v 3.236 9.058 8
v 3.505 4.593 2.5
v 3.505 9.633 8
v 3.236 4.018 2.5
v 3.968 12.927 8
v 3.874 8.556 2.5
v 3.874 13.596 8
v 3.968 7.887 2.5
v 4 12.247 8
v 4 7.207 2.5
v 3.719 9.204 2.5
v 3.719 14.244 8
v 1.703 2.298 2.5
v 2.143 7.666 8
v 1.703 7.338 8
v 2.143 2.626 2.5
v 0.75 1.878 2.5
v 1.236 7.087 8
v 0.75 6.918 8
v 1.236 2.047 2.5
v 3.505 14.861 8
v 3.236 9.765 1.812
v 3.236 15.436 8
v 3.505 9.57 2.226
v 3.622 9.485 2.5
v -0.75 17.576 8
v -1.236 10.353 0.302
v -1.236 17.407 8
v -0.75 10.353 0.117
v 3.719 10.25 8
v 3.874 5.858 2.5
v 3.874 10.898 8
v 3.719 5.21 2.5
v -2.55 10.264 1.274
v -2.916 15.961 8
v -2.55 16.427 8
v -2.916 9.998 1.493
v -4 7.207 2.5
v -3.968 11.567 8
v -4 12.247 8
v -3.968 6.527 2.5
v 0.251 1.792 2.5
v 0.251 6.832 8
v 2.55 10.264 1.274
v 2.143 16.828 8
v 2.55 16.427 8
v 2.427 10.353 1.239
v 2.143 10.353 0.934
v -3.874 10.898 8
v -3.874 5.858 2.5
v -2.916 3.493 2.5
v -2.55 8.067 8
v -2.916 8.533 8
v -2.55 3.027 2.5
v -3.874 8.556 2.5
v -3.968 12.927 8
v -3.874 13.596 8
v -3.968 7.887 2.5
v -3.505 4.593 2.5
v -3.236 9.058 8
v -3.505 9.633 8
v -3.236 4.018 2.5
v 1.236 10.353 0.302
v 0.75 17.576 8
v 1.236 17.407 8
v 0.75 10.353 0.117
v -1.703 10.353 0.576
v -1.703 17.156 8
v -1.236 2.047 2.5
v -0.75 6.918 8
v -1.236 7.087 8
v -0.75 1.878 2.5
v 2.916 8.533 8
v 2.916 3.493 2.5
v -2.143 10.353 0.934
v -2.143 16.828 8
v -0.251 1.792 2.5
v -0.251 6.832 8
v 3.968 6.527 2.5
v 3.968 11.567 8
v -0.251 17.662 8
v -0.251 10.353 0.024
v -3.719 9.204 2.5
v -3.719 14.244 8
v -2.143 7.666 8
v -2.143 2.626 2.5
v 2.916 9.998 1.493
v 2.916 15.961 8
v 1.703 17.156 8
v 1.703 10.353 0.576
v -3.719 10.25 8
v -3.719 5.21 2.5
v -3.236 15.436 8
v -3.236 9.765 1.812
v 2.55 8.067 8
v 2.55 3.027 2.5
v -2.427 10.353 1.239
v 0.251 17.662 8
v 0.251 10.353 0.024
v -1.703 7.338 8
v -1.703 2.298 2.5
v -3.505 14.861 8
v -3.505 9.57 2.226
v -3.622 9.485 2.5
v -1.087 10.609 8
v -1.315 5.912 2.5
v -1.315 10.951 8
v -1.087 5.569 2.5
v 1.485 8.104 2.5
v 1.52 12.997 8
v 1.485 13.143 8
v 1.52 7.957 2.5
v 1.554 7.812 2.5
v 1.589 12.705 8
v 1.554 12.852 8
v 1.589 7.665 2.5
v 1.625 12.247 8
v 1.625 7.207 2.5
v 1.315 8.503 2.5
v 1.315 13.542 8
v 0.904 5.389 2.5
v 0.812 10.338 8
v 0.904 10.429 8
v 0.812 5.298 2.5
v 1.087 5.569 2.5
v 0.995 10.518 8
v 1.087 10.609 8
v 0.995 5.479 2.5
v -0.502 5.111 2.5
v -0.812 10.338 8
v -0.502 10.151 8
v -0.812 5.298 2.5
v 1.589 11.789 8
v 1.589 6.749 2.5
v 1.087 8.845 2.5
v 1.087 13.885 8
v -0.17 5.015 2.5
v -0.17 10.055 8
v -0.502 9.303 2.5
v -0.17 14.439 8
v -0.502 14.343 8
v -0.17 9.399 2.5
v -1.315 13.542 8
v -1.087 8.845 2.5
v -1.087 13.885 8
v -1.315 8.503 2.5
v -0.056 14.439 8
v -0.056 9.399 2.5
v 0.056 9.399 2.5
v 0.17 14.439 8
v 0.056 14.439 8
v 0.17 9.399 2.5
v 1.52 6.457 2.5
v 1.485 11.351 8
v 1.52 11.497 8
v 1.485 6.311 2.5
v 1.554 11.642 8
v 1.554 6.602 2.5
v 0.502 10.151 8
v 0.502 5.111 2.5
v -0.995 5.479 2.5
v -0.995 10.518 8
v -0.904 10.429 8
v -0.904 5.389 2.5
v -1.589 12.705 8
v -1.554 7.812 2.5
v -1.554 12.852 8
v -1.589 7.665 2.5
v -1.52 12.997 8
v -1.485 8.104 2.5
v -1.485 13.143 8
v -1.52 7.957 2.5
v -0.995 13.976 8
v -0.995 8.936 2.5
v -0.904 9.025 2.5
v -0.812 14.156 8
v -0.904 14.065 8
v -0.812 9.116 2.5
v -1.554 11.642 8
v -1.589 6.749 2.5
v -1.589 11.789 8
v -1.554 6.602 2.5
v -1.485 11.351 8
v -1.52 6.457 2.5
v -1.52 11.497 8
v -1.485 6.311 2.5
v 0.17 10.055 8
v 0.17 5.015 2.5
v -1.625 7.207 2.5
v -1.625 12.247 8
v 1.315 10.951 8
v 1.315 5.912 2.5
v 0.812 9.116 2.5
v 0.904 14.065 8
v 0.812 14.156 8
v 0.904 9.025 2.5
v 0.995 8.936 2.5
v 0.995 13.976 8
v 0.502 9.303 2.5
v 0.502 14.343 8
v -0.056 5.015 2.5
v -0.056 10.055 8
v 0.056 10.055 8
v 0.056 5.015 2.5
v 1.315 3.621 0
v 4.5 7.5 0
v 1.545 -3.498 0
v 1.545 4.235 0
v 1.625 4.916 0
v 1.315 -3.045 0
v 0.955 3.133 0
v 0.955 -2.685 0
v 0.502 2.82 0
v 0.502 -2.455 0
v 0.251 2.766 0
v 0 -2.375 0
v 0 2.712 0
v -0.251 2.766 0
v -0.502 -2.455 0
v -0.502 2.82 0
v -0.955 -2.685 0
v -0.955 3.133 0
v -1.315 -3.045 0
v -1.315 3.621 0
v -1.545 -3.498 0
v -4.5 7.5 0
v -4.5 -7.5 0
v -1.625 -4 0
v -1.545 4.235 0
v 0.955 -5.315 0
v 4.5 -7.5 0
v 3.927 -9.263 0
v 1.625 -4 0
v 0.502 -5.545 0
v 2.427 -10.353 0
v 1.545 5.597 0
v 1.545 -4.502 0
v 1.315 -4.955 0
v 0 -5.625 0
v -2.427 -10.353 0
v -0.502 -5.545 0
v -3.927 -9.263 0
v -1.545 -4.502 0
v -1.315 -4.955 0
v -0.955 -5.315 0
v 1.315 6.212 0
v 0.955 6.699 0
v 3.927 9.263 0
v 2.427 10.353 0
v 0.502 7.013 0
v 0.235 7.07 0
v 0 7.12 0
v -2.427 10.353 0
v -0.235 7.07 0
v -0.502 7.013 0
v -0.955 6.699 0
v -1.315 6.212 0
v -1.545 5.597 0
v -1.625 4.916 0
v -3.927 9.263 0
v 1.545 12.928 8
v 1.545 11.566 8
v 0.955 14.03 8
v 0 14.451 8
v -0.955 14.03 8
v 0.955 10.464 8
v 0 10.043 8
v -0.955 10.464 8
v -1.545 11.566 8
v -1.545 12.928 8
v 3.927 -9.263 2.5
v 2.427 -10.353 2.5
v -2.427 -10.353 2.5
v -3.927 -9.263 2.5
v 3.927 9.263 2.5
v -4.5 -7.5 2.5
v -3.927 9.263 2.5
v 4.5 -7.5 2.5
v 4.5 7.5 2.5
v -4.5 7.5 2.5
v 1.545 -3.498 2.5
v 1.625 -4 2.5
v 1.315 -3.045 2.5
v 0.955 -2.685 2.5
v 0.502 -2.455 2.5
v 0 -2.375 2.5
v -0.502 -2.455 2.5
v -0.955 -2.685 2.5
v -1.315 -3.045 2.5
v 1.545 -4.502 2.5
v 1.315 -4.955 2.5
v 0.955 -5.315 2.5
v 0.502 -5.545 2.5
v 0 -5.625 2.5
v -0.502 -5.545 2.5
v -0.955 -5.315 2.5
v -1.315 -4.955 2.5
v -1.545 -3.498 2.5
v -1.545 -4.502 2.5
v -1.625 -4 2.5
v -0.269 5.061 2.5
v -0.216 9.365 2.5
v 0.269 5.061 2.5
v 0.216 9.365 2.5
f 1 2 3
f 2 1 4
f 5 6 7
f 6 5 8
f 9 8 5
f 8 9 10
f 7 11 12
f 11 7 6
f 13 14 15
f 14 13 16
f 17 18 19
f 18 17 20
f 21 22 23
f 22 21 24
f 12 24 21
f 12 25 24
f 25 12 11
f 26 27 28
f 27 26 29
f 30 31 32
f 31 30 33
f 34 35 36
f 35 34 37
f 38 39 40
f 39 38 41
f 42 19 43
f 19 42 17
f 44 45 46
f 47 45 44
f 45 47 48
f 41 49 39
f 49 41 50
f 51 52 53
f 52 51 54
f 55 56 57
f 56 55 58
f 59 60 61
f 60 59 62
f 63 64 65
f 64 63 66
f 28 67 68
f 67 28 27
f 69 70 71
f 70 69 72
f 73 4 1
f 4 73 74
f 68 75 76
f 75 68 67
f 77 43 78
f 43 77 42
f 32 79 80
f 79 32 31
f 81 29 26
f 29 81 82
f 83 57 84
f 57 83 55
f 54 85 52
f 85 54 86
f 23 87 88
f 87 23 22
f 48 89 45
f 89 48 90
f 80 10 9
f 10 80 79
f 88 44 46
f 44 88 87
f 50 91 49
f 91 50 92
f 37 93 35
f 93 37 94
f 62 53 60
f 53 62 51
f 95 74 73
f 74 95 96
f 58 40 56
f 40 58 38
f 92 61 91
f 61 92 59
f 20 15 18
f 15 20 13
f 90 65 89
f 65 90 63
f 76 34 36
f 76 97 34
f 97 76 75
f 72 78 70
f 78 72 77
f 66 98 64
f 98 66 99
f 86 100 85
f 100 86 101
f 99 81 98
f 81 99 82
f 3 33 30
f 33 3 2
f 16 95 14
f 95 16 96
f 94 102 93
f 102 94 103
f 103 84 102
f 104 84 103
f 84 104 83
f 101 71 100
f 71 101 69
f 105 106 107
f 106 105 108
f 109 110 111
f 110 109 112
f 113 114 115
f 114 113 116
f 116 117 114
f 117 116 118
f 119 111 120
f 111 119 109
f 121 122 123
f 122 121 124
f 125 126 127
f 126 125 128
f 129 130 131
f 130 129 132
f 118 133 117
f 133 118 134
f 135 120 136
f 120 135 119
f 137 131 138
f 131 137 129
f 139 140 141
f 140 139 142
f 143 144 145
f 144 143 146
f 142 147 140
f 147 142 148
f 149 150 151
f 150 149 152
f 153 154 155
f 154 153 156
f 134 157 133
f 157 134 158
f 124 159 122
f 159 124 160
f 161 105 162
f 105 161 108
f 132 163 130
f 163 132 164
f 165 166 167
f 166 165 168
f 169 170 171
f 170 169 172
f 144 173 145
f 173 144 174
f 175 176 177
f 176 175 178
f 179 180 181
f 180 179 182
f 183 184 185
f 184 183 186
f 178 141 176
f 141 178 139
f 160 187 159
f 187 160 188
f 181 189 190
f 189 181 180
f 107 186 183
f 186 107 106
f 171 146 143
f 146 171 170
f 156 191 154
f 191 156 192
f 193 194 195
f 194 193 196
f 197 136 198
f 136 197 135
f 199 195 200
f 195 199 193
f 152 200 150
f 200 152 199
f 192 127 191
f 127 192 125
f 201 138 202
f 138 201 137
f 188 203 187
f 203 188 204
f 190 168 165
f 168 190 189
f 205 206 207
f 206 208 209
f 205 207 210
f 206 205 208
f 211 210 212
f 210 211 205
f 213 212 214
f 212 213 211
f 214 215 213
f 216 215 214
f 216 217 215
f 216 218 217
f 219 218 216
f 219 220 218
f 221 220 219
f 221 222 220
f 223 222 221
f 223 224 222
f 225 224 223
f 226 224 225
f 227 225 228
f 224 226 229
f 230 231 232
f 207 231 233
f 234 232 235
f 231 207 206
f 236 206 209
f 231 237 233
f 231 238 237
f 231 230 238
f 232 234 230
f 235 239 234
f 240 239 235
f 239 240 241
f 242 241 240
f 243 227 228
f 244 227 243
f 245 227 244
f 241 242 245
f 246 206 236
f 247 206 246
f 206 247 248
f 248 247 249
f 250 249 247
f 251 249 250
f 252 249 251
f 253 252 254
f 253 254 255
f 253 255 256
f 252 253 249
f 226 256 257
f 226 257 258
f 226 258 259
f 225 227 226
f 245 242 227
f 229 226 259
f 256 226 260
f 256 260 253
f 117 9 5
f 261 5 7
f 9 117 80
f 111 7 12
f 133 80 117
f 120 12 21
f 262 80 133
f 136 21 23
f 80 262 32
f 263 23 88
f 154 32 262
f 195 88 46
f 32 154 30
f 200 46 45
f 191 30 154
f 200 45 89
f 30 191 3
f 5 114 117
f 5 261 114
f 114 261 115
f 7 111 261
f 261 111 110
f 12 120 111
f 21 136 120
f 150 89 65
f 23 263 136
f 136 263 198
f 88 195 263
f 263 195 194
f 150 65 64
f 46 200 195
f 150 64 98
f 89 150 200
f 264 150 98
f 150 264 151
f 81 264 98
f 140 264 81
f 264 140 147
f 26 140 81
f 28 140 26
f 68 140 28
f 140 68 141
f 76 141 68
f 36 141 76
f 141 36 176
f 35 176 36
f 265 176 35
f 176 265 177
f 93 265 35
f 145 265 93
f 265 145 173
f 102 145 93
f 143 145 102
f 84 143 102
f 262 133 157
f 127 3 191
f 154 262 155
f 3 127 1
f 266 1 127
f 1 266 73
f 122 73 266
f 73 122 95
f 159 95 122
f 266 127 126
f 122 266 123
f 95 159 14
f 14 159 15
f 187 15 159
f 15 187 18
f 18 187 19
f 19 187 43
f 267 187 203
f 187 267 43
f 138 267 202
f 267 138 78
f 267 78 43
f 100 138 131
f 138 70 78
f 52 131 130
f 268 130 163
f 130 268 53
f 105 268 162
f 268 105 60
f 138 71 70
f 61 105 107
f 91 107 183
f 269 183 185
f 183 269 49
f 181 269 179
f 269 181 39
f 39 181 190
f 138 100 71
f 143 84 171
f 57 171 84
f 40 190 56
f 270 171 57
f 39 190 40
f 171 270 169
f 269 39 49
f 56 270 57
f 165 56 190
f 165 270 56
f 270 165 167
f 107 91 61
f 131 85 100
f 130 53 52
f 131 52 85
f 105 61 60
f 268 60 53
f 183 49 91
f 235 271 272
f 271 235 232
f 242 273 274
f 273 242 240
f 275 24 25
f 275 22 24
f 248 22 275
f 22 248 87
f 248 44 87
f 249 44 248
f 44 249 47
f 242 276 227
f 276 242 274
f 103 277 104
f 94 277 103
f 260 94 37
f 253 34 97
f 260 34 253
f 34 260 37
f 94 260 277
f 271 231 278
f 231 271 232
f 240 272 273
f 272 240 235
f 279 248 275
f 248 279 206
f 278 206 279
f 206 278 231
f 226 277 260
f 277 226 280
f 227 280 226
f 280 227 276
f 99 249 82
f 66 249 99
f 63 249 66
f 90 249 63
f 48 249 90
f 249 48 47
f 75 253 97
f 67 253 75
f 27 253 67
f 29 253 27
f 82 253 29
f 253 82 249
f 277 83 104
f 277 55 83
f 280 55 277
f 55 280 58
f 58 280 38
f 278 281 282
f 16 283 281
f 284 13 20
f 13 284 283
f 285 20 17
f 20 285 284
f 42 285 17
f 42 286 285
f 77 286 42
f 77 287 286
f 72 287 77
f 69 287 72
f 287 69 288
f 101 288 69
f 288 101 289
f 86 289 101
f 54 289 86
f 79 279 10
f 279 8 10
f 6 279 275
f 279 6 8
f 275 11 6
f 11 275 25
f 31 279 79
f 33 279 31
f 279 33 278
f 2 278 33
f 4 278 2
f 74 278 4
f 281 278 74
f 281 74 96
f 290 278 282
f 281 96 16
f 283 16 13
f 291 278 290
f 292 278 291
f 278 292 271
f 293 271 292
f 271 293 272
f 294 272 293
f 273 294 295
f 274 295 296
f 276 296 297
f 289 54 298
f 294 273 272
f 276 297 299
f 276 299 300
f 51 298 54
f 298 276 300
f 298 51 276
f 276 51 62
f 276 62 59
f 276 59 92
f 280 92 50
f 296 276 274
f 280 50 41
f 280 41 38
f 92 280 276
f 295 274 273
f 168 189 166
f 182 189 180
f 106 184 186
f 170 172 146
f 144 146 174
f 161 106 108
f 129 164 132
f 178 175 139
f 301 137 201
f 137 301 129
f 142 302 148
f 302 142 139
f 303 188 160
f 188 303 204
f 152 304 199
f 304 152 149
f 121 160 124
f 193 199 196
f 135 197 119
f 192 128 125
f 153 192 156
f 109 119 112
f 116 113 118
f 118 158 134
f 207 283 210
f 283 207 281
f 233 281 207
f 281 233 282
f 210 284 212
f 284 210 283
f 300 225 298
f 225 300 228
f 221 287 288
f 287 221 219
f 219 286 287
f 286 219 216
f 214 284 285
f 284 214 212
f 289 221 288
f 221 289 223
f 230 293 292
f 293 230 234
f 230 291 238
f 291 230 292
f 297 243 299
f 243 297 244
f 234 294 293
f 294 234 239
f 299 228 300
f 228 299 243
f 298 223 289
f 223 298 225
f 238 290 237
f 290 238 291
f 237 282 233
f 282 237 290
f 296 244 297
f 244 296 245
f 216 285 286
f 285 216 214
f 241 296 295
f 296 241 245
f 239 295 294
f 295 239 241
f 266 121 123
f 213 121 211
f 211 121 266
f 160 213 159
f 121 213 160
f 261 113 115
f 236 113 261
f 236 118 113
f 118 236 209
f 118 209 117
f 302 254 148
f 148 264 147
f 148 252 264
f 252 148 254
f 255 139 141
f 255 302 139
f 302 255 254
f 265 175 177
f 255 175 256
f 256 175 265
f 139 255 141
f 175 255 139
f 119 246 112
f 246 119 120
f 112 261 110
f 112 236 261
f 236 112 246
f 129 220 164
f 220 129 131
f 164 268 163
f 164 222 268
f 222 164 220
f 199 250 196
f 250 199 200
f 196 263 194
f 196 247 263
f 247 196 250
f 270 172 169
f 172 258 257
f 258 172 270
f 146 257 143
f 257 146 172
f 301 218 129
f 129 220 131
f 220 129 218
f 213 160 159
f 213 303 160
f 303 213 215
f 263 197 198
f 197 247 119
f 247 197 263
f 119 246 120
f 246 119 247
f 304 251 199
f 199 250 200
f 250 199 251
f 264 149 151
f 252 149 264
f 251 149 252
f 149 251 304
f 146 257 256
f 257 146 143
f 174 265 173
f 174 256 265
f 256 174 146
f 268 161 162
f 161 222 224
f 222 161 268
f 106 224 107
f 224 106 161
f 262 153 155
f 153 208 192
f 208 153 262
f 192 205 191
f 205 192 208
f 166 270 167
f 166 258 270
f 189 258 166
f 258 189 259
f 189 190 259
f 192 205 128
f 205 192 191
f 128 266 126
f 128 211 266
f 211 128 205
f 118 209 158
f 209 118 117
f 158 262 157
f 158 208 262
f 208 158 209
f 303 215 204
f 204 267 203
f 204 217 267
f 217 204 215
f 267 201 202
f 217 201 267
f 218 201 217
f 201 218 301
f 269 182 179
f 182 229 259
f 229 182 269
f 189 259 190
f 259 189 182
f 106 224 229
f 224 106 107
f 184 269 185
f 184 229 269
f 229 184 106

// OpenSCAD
// file: dronePlates.scad
/**
 * dronePlates.scad
 * Plate library
 *
 * GNU GPL V3
 * @author: Victor Potenciano
 */

m3Rad = 3.4/2;
cornerR = 4;

/**
 *
 */
module helperDisk(diameter) {
	cylinder(r = diameter/2, h = 0.6, $fn=20);
}

/**
 *
 */
module roundedRect(size, radius) {
	x = size[0];
	y = size[1];
	z = size[2];

	linear_extrude(height=z)
	hull() {
	// place 4 circles in the corners, with the given radius
	translate([(-x/2)+(radius/2), (-y/2)+(radius/2), 0]){ circle(r=radius); }
	translate([(x/2)-(radius/2), (-y/2)+(radius/2), 0]){ circle(r=radius); }
	translate([(-x/2)+(radius/2), (y/2)-(radius/2), 0]){ circle(r=radius); }
	translate([(x/2)-(radius/2), (y/2)-(radius/2), 0]){ circle(r=radius); }
	}
}

/**
 * rounded rectangle triangle with corner at origin
 */
module roundedTriangle(size, radius) {
	x = size[0];
	y = size[1];
	z = size[2];

	linear_extrude(height=z)
	hull() {
	translate([radius, radius, 0]){ circle(r=radius); }
	translate([x-radius, radius, 0]){ circle(r=radius); }
	translate([radius, y-radius, 0]){ circle(r=radius); }
	}
}

/**
 *
 */
module roundRectPlate(w, l, plateThick=3) {
	difference(){
		roundedRect([l+m3Rad*1.75,w+m3Rad*1.75,plateThick], cornerR);
		translate([l/2, w/2, -0.5]) { cylinder(h = plateThick+1, r = m3Rad, $fn=30); }
		translate([-l/2, w/2, -0.5]) { cylinder(h = plateThick+1, r = m3Rad, $fn=30); }
		translate([l/2, -w/2, -0.5]) { cylinder(h = plateThick+1, r = m3Rad, $fn=30); }
		translate([-l/2, -w/2, -0.5]) { cylinder(h = plateThick+1, r = m3Rad, $fn=30); }
	}
}

/**
 *
 */
module crossSquarePlate(l, thick=3) {
	inDist = cornerR*2+4;
	trianL = sqrt((l*l)/2)-inDist;
	centerR = 4;

	difference(){
		roundRectPlate(l, l, thick);
		translate([0, centerR, -0.5]) { 
			rotate([0,0,45]){ roundedTriangle([trianL,trianL,thick+1], cornerR-2); }
		}
		translate([0, -centerR, -0.5]) { 
			rotate([0,0,225]){ roundedTriangle([trianL,trianL,thick+1], cornerR-2); }
		}
		translate([-centerR, 0, -0.5]) { 
			rotate([0,0,135]){ roundedTriangle([trianL,trianL,thick+1], cornerR-2); }
		}
		translate([centerR, 0, -0.5]) { 
			rotate([0,0,-45]){ roundedTriangle([trianL,trianL,thick+1], cornerR-2); }
		}
	}
}

/**
 *
 */
module hShapePlate(w, l, thick=4) {
	inDist = cornerR*2+1;

	difference(){
		roundRectPlate(w, l, thick);
		translate([0, w/4, -0.5]) { roundedRect([l-inDist,w/2-inDist,thick+1], cornerR-2); }
		translate([0, -w/4, -0.5]) { roundedRect([l-inDist,w/2-inDist,thick+1], cornerR-2); }
	}
}

/**
 *
 */
module motorCircleMount(inDia, outDia, thick=3, extraH=false, d1=19, d2=16, holeR=m3Rad ) {
	difference(){
		cylinder(h = thick, r = outDia/2, $fn=30);
		motorCircleMountHoles(inDia, outDia, thick, extraH, d1=d1, d2=d2, holeR=holeR);
	}
}

/**
 *
 */
module motorCircleMountHoles(inDia, outDia, thick=3, extraH=false, d1=19, d2=16, d3=25, holeR=m3Rad) {
	translate([0, 0, -0.5]) { cylinder(h = thick+1, r = inDia/2, $fn=30); }

	for(i=[0:3]) {
		rotate([0,0,90*i]){
		translate([d1/2, 0, -0.5]) cylinder(h = thick+1, r = holeR, $fn=20);
		translate([d2/2, 0, -0.5]) cylinder(h = thick+1, r = holeR, $fn=20);
		translate([d2/2, -holeR, -0.5]) cube(size = [(d1-d2)/2,holeR*2,thick+1]);
		}
	}
	
	if(extraH==true){	
		for(i=[-1,1]) translate([i*d3/2, 0, -0.5]) { cylinder(h = thick+1, r = holeR, $fn=30); }
	}
}

/**
 *
 */
module motorRectMount(w, l, inDia, thick=3) {
	d1=19;
	d2=16;

	difference(){
		roundRectPlate(w, l, thick);
		translate([0, 0, -0.5]) { cylinder(h = thick+1, r = inDia/2, $fn=30); }
		translate([0, d1/2, -0.5]) { cylinder(h = thick+1, r = m3Rad, $fn=30); }
		translate([0, -d1/2, -0.5]) { cylinder(h = thick+1, r = m3Rad, $fn=30); }
		translate([d2/2, 0, -0.5]) { cylinder(h = thick+1, r = m3Rad, $fn=30); }
		translate([-d2/2, 0, -0.5]) { cylinder(h = thick+1, r = m3Rad, $fn=30); }
	}
}

/**
 *
 */
module tube(inDia, outDia, height) {
	difference(){
		cylinder(h = height, r = outDia/2, $fn=50);
		translate([0, 0, -0.5]) { cylinder(h = height+1, r = inDia/2, $fn=30); }
	}
}

/**
 *
 */
module squareTube(inDia, outDia, height) {
	translate([0,0,height/2]){
	difference(){
		cube(size = [outDia,outDia,height], center = true);
		cube(size = [inDia,inDia,height+1], center = true);
	}
	}
}

/**
 *
 */
module djiFlamewheelHoles(height) {
	a = 23;
	b = 16;
	c = 19.5;
	
	translate([a/2, c/2, 0]) { cylinder(h = height, r = m3Rad, $fn=30); }
	translate([-a/2, c/2, 0]) { cylinder(h = height, r = m3Rad, $fn=30); }
	translate([b/2, -c/2, 0]) { cylinder(h = height, r = m3Rad, $fn=30); }
	translate([-b/2, -c/2, 0]) { cylinder(h = height, r = m3Rad, $fn=30); }
}

/**
 *
 */
module djiFlamewheelHolesBotton(height) {
	a1 = 21;
	c = 19.5;
	
	translate([a1/2, c/2, 0]) { cylinder(h = height, r = m3Rad, $fn=30); }
	translate([-a1/2, c/2, 0]) { cylinder(h = height, r = m3Rad, $fn=30); }
}

/**
 *
 */
module propeller(size){
union(){
difference(){
	cylinder(h = 3, r = size/2, center=true, $fn=30);
	cylinder(h = 3.1, r = size/2-2, center=true, $fn=30); 
}
for( i = [-1,1] ){
rotate([0,0,45*i]){ cube(size = [size,4,1], center = true); }
}
}
}

/**
 *
 */
module slot(length, height, rad){
for(i=[-1,1]) translate([i*length/2,0,0]) cylinder(h = height, r = rad, $fn=30);
translate([0,0,height/2]) cube(size = [length,rad*2,height], center = true);
}

 

////////////////////////
// Examples:
////////////////////////

motorCircleMount(8, 25, 3.5);

//roundedRect([50,50,3], 4);

//hShapePlate(79, 25);

//rotate([0,0,45]){roundedTriangle([40,40,3], 4);}

//crossSquarePlate(45, 4);

/*
union(){
motorRectMount(21, 18, 8, 4);
translate([9, 10.5, 0]) {tube(m3Rad*2, 6.5, 6);}
}
*/

/*
difference(){
union(){
hShapePlate(50, 30, 3.5);
translate([-4,-25,0]){cube(size = [8,50,3.5]);}
rotate([0, 0, 45]) {motorCircleMount(8, 35, 3.5);}
}
cylinder(h = 10, r = 4, $fn=100, center=true);
}
*/

//rotate([90,0,0]){ tube(5,10,20); }
//translate([20,0,0]){ squareTube(5, 10, 20); }
// main file
/**
 * mini H parametrized antenna mount
 */
 
use <dronePlates.scad>;


m3Rad = 3.25/2;
thick = 2.5;
angle2 = 85;
holeAntDist = 8;

difference(){
    union(){
        roundedRect([6,holeAntDist+10,thick],3);
        
        //antenna holder
        difference(){
        translate([0,holeAntDist/2,-1]) rotate([-angle2/2,0,0]) tube(m3Rad*2, 8, 19);
        

        translate([0,0,-10/2]) cube(size=[100,100,10], center=true);
        translate([0,holeAntDist/2,10/2+8]) cube(size=[20,40,10], center=true);
        }//diff
    }
    
    for(i=[-1,1]){
        translate([0,-holeAntDist/2,-0.5]) cylinder(r=m3Rad, h=thick+1, $fn=20);
    }
    
    
    translate([0,holeAntDist/2,-1]) rotate([-angle2/2,0,0]) cylinder(r=m3Rad, h=90, $fn=20,center=true);
    
}
